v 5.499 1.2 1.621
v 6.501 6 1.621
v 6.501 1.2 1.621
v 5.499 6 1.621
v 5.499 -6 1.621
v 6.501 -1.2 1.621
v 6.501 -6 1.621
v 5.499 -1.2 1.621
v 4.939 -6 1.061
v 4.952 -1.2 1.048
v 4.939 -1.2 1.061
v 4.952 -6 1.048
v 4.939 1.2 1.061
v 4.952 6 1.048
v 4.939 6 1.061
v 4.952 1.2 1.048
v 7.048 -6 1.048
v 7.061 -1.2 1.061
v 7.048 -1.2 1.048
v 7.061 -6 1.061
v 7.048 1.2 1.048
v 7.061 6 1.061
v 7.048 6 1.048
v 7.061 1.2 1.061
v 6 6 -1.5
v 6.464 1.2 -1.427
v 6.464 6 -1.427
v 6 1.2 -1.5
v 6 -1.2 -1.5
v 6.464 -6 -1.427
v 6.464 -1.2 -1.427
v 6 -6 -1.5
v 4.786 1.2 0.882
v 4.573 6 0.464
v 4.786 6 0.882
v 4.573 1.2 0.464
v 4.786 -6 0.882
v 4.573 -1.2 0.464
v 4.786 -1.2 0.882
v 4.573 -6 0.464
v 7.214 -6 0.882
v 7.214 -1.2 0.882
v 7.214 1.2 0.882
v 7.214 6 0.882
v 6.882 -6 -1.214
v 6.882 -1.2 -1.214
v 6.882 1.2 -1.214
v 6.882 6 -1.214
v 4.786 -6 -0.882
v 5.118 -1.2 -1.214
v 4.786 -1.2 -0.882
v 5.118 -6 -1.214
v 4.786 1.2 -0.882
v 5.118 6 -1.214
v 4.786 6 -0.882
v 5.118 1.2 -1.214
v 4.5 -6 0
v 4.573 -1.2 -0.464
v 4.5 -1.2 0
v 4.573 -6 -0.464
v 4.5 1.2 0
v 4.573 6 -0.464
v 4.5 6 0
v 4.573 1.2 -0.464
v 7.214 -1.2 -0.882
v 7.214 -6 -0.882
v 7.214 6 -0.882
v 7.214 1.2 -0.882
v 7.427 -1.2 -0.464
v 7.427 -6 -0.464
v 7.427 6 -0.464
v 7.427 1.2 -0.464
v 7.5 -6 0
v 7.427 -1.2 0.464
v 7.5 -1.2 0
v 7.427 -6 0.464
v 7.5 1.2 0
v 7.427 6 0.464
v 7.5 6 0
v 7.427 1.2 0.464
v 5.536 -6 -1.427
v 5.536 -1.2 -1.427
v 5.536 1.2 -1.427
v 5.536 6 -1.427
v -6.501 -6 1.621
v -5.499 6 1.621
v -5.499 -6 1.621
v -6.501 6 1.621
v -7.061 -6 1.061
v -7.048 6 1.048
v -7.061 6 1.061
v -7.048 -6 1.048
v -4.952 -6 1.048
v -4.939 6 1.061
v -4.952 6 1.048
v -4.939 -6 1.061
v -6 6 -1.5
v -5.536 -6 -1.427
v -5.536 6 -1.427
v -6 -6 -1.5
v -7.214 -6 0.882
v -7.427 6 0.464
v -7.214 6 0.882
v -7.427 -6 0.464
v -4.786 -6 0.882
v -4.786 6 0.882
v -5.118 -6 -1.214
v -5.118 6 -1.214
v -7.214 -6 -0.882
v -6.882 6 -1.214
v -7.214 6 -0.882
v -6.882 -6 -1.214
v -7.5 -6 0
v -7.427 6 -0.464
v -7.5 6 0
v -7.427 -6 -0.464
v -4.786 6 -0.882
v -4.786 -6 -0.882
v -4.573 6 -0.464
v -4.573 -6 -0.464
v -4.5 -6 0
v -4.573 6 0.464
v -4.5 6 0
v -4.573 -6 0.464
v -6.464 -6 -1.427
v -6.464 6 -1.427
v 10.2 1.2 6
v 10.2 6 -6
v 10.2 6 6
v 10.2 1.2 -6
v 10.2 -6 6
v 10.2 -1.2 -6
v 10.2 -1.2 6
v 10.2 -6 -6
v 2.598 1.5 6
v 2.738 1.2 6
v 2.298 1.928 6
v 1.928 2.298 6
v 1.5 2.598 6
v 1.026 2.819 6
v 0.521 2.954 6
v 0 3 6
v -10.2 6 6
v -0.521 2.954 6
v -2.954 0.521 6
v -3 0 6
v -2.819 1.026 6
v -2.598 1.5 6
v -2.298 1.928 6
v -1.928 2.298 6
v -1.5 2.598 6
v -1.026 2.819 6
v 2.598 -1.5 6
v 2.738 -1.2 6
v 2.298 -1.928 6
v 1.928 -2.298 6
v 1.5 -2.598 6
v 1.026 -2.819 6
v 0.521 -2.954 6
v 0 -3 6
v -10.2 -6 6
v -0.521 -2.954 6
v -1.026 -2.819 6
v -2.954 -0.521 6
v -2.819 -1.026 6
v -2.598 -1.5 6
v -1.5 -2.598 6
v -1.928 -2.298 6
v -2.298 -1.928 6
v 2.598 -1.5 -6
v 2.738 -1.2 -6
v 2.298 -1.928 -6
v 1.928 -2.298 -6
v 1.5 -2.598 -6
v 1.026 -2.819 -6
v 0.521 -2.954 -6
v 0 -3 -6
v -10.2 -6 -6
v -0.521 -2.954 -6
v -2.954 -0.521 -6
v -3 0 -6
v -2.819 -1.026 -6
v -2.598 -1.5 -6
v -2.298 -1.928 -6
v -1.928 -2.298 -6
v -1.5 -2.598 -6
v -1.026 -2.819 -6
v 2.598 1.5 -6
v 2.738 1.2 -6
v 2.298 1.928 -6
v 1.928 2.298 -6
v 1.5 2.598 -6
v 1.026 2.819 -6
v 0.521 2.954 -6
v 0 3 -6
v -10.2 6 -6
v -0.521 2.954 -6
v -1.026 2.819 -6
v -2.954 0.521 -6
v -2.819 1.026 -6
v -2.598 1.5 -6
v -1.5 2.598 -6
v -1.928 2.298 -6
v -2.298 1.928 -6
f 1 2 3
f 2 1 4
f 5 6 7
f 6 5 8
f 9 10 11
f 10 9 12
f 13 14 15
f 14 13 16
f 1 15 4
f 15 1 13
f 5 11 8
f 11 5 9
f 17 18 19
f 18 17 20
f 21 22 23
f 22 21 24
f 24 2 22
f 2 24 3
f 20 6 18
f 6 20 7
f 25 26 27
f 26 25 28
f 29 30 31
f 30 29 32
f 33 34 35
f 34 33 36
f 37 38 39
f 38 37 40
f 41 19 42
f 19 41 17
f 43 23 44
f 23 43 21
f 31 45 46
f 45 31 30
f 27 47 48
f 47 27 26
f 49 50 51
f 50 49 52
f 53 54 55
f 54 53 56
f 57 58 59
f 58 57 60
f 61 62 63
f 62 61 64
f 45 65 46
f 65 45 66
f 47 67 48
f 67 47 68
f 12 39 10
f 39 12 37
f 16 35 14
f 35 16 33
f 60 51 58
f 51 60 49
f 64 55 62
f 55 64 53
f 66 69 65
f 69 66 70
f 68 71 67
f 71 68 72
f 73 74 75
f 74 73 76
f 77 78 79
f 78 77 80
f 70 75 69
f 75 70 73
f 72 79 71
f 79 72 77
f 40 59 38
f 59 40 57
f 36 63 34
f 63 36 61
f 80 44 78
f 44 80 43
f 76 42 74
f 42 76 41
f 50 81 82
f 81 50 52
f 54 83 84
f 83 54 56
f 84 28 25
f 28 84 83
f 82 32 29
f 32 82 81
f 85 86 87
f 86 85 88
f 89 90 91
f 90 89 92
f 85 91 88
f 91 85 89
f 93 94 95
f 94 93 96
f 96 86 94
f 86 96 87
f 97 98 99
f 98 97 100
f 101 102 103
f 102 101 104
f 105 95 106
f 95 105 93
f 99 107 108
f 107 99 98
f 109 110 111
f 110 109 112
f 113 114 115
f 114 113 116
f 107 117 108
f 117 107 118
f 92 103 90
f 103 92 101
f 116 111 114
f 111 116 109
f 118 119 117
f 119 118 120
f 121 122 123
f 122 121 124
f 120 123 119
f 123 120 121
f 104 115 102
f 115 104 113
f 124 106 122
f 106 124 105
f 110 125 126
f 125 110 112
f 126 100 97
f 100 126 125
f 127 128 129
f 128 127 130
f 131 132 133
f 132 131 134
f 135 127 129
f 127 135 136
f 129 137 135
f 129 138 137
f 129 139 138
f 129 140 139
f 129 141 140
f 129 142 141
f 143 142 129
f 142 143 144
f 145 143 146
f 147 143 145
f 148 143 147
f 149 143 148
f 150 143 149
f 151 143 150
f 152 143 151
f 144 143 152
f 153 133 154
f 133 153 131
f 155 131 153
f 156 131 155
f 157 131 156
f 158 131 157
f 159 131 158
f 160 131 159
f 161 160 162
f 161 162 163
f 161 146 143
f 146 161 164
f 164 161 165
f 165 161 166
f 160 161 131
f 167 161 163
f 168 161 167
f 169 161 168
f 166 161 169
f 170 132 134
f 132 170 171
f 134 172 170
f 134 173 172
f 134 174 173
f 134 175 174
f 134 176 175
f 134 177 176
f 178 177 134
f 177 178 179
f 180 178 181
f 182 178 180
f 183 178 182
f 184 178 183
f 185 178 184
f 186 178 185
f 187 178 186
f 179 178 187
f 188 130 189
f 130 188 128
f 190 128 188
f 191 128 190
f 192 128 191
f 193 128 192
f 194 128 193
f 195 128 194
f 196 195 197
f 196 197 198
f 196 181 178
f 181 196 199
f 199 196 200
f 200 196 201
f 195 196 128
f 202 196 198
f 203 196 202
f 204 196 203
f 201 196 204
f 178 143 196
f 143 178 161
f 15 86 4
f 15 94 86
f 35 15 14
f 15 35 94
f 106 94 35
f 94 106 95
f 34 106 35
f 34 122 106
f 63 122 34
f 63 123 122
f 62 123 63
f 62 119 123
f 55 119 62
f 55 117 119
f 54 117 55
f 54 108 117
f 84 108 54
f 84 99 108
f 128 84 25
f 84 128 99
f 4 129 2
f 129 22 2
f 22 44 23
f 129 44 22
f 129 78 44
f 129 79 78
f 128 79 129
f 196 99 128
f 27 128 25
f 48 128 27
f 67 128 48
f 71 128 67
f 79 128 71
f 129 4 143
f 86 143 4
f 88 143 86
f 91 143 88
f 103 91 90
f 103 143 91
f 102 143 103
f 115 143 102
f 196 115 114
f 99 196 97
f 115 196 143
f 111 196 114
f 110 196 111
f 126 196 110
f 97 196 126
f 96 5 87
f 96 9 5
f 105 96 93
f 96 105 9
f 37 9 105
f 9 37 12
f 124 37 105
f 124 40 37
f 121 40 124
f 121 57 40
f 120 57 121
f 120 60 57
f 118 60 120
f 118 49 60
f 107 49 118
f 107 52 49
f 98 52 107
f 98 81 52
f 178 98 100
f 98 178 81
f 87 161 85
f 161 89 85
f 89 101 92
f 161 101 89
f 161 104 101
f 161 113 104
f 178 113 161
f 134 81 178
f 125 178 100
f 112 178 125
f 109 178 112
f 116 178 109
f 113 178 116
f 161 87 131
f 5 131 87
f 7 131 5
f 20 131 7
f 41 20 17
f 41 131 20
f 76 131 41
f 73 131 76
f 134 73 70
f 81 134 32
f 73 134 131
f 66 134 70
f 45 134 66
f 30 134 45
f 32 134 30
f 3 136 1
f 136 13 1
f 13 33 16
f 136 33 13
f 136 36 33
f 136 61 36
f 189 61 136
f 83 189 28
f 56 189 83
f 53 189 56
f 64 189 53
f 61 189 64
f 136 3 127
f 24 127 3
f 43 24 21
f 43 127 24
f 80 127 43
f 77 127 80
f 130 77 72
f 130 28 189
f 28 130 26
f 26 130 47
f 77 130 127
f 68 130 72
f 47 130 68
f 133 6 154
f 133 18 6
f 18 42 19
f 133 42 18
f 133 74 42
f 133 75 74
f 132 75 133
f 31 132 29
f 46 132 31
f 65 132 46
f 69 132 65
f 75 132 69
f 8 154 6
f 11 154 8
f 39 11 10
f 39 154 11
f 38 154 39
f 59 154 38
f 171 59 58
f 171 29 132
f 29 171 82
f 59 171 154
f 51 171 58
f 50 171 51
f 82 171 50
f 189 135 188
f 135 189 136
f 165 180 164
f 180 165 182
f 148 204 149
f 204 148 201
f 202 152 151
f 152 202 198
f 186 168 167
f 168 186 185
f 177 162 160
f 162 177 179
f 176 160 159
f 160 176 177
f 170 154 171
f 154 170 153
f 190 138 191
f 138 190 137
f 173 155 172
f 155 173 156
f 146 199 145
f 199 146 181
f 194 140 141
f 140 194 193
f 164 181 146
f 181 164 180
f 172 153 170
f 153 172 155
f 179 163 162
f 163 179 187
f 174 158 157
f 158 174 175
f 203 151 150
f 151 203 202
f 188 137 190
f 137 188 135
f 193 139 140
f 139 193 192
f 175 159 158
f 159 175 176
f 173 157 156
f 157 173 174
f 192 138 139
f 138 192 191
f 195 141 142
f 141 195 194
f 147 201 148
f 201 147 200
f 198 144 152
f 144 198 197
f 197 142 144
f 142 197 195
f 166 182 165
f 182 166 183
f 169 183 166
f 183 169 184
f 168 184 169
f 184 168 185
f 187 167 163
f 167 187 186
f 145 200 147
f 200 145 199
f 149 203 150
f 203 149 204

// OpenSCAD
// file: library.scad
include <parameters.scad>;


// inner and outer product.  Why aren't these standard?!!!?

function ip(v1 = [0,0,0], v2 = [0,0,0]) = v1.x*v2.x + v1.y*v2.y + v1.z*v2.z;

function op(v1 = [0,0,0], v2 = [0,0,0]) = [v1.y*v2.z - v1.z*v2.y, v1.z*v2.x - v1.x*v2.z, v1.x*v2.y - v1.y*v2.x];


// Make a RepRap teardrop with its axis along Z
// If truncated is true, chop the apex; if not, come to a point

// I stole this function from Erik...


module teardrop(radius, height, truncateMM)
{
	union()
	{
		if(truncateMM > 0)
		{
			intersection()
			{
				translate([truncateMM,0,height/2]) 
					scale([1,1,height])
						cube([radius*2.8275,radius*2,1],center=true);
				scale([1,1,height]) 
						rotate([0,0,3*45])
							cube([radius,radius,1]);
			}
		} else
		{
			scale([1,1,height])
				rotate([0,0,3*45])
					cube([radius,radius,1]);
		}
		cylinder(r=radius, h = height, $fn=20);
	}
}

// Make a cuboid with a 45 degree top for vertical slots etc

module cen_hat(size)
{
	translate([0, 0, size.x/sqrt(2)])
		union()
		{
			rotate([0, 45, 0])
				cube([size.x, size.y, 5*max(size.x, max(size.y, size.z))], center=true);
			rotate([0, -45, 0])
				cube([size.x, size.y, 5*max(size.x, max(size.y, size.z))], center=true);
		}
}

module hat_cube(size = [1,1,1], center = false)
{
	difference()
	{
		cube(size, center);
		if(center)
			translate([0, 0, size.z/2])
				cen_hat(size);
		else
			translate([size.x/2, size.y/2, size.z])
				cen_hat(size);
	}
}



module rod(length, threaded) if (threaded && renderrodthreads) {
	linear_extrude(height = length, center = true, convexity = 10, twist = -360 * length / rodpitch, $fn = fn)
		translate([rodsize * 0.1 / 2, 0, 0])
			circle(r = rodsize * 0.9 / 2, $fn = fn);
} else cylinder(h = length, r = rodsize / 2, center = true, $fn = fn);


module rodnut(position, washer) render() translate([0, 0, position]) {
	intersection() {
		scale([1, 1, 0.5]) sphere(r = 1.05 * rodsize, center = true);
		difference() {
			cylinder (h = rodnutsize, r = rodnutdiameter / 2, center = true, $fn = 6);
			rod(rodnutsize + 0.1);
		}
	}
	if (washer == 1 || washer == 4) rodwasher(((position > 0) ? -1 : 1) * (rodnutsize + rodwashersize) / 2);
	if (washer == 2 || washer == 4) rodwasher(((position > 0) ? 1 : -1) * (rodnutsize + rodwashersize) / 2);
}


module rodwasher(position) render() translate ([0, 0, position]) difference() {
	cylinder(r = rodwasherdiameter / 2, h = rodwashersize, center = true, $fn = fn);
	rod(rodwashersize + 0.1);
}


module screw(length, nutpos, washer, bearingpos = -1) union(){
	translate([0, 0, -length / 2]) if (renderscrewthreads) {
		linear_extrude(height = length, center = true, convexity = 10, twist = -360 * length / screwpitch, $fn = fn)
			translate([screwsize * 0.1 / 2, 0, 0])
				circle(r = screwsize * 0.9 / 2, $fn = fn);
	} else cylinder(h = length, r = screwsize / 2, center = true, $fn = fn);
	render() difference() {
		translate([0, 0, screwsize / 2]) cylinder(h = screwsize, r = screwsize, center = true, $fn = fn);
		translate([0, 0, screwsize]) cylinder(h = screwsize, r = screwsize / 2, center = true, $fn = 6);
	}
	if (washer > 0 && nutpos > 0) {
		washer(nutpos);
		nut(nutpos + washersize);
	} else if (nutpos > 0) nut(nutpos);
	if (bearingpos >= 0) bearing(bearingpos);
}


module bearing(position) render() translate([0, 0, -position - bearingwidth / 2]) union() {
	difference() {
		cylinder(h = bearingwidth, r = bearingsize / 2, center = true, $fn = fn);
		cylinder(h = bearingwidth * 2, r = bearingsize / 2 - 1, center = true, $fn = fn);
	}
	difference() {
		cylinder(h = bearingwidth - 0.5, r = bearingsize / 2 - 0.5, center = true, $fn = fn);
		cylinder(h = bearingwidth * 2, r = screwsize / 2 + 0.5, center = true, $fn = fn);
	}
	difference() {
		cylinder(h = bearingwidth, r = screwsize / 2 + 1, center = true, $fn = fn);
		cylinder(h = bearingwidth + 0.1, r = screwsize / 2, center = true, $fn = fn);
	}
}


module nut(position, washer) render() translate([0, 0, -position - nutsize / 2]) {
	intersection() {
		scale([1, 1, 0.5]) sphere(r = 1.05 * screwsize, center = true);
		difference() {
			cylinder (h = nutsize, r = nutdiameter / 2, center = true, $fn = 6);
			cylinder(r = screwsize / 2, h = nutsize + 0.1, center = true, $fn = fn);
		}
	}
	if (washer > 0) washer(0);
}


module washer(position) render() translate ([0, 0, -position - washersize / 2]) difference() {
	cylinder(r = washerdiameter / 2, h = washersize, center = true, $fn = fn);
	cylinder(r = screwsize / 2, h = washersize + 0.1, center = true, $fn = fn);
}


//rod(20);
//translate([rodsize * 2.5, 0, 0]) rod(20, true);
//translate([rodsize * 5, 0, 0]) screw(10, true);
//translate([rodsize * 7.5, 0, 0]) bearing();
//translate([rodsize * 10, 0, 0]) rodnut();
//translate([rodsize * 12.5, 0, 0]) rodwasher();
//translate([rodsize * 15, 0, 0]) nut();
//translate([rodsize * 17.5, 0, 0]) washer();

//hat_cube(size=[2,40,2], center=false);
// file: parameters.scad
// Parameters file for RepRap Huxley

pi=3.14159265;

// The relative location in your file system where the .dxf files are
// DXFs are for quick development.  They should be replaced by parameterised CSG in dure course.

fileroot="DXF-files/";

rodsize = 6;	//threaded/smooth rod diameter in mm
xaxis = 182.5;	//width of base in mm
yaxis = 266.5;	//length of base in mm


screwsize = 3;	//bearing bore/screw diameter in mm
bearingsize = 10;	//outer diameter of bearings in mm
bearingwidth = 4;	//width of bearings in mm


rodpitch = rodsize / 6;
rodnutsize = 0.8 * rodsize;
rodnutdiameter = 1.9 * rodsize;
rodwashersize = 0.2 * rodsize;
rodwasherdiameter = 2 * rodsize;
screwpitch = screwsize / 6;
nutsize = 0.8 * screwsize;
nutdiameter = 1.9 * screwsize;
washersize = 0.2 * screwsize;
washerdiameter = 2 * screwsize;
partthick = 2 * rodsize;
vertexrodspace = 2 * rodsize;


c = [0.3, 0.3, 0.3];
rodendoffset = rodnutsize + rodwashersize * 2 + partthick / 2;
vertexoffset = vertexrodspace + rodendoffset;


renderrodthreads = false;
renderscrewthreads = false;
fn = 36;

// The gap between the joining rods at a vertex

vertex_radius=sqrt(rodsize*rodsize + vertexoffset*vertexoffset);
vertex_ang = atan(vertexoffset/rodsize)-30;
vertex_gap = 2*vertex_radius*cos(vertex_ang);

// Nema 14 dimensions - these are absolute

nema14_square=35.3;
nema14_screws=26;
nema14_hub=22;
nema14_hub_depth=2;
nema14_length=36;
nema14_shaft=5;
nema14_shaft_length=66;
nema14_shaft_projection=19;

// The RepRap slide bearings

bearing_mount_centres=18;
bearing_width=7;

// X axis parameters - many should be relative

motor_center_y = 26;
bar_clamp_x=5;
bar_clamp_y=8;
bar_clamp_x_gap=23;
bearing_y=50;
bearing_x=bar_clamp_x_gap + 10;
hole_land=4;
thickness=5;
bearing_low_z = 8;
bearing_z_gap = 25;
bearing_plate_width = bearing_mount_centres+2*hole_land + 10;
bearing_plate_overlap=0.5;
bearing_plate_support=10;
// main file
include <parameters.scad>;
use <library.scad>;



module y_bar_clamp()
{
	difference()
	{
		cube([partthick*1.7,partthick,partthick], center=true);
		translate([partthick*0.75, 0, 0])
			cube([partthick*1.5,0.2*partthick,partthick*2], center=true);
		rod(rodsize*5);
		translate([rodsize, 2*rodsize, 0])
		rotate([90, 0, 0])
			rotate([0, 0, -90])
				teardrop(radius = screwsize/2, height = rodsize * 5, truncateMM = 0.5);
		translate([-rodsize, 2*rodsize, 0])
		rotate([90, 0, 0])
			rotate([0, 0, -90])
				teardrop(radius = screwsize/2, height = rodsize * 5, truncateMM = 0.5);
	}
}

y_bar_clamp();
